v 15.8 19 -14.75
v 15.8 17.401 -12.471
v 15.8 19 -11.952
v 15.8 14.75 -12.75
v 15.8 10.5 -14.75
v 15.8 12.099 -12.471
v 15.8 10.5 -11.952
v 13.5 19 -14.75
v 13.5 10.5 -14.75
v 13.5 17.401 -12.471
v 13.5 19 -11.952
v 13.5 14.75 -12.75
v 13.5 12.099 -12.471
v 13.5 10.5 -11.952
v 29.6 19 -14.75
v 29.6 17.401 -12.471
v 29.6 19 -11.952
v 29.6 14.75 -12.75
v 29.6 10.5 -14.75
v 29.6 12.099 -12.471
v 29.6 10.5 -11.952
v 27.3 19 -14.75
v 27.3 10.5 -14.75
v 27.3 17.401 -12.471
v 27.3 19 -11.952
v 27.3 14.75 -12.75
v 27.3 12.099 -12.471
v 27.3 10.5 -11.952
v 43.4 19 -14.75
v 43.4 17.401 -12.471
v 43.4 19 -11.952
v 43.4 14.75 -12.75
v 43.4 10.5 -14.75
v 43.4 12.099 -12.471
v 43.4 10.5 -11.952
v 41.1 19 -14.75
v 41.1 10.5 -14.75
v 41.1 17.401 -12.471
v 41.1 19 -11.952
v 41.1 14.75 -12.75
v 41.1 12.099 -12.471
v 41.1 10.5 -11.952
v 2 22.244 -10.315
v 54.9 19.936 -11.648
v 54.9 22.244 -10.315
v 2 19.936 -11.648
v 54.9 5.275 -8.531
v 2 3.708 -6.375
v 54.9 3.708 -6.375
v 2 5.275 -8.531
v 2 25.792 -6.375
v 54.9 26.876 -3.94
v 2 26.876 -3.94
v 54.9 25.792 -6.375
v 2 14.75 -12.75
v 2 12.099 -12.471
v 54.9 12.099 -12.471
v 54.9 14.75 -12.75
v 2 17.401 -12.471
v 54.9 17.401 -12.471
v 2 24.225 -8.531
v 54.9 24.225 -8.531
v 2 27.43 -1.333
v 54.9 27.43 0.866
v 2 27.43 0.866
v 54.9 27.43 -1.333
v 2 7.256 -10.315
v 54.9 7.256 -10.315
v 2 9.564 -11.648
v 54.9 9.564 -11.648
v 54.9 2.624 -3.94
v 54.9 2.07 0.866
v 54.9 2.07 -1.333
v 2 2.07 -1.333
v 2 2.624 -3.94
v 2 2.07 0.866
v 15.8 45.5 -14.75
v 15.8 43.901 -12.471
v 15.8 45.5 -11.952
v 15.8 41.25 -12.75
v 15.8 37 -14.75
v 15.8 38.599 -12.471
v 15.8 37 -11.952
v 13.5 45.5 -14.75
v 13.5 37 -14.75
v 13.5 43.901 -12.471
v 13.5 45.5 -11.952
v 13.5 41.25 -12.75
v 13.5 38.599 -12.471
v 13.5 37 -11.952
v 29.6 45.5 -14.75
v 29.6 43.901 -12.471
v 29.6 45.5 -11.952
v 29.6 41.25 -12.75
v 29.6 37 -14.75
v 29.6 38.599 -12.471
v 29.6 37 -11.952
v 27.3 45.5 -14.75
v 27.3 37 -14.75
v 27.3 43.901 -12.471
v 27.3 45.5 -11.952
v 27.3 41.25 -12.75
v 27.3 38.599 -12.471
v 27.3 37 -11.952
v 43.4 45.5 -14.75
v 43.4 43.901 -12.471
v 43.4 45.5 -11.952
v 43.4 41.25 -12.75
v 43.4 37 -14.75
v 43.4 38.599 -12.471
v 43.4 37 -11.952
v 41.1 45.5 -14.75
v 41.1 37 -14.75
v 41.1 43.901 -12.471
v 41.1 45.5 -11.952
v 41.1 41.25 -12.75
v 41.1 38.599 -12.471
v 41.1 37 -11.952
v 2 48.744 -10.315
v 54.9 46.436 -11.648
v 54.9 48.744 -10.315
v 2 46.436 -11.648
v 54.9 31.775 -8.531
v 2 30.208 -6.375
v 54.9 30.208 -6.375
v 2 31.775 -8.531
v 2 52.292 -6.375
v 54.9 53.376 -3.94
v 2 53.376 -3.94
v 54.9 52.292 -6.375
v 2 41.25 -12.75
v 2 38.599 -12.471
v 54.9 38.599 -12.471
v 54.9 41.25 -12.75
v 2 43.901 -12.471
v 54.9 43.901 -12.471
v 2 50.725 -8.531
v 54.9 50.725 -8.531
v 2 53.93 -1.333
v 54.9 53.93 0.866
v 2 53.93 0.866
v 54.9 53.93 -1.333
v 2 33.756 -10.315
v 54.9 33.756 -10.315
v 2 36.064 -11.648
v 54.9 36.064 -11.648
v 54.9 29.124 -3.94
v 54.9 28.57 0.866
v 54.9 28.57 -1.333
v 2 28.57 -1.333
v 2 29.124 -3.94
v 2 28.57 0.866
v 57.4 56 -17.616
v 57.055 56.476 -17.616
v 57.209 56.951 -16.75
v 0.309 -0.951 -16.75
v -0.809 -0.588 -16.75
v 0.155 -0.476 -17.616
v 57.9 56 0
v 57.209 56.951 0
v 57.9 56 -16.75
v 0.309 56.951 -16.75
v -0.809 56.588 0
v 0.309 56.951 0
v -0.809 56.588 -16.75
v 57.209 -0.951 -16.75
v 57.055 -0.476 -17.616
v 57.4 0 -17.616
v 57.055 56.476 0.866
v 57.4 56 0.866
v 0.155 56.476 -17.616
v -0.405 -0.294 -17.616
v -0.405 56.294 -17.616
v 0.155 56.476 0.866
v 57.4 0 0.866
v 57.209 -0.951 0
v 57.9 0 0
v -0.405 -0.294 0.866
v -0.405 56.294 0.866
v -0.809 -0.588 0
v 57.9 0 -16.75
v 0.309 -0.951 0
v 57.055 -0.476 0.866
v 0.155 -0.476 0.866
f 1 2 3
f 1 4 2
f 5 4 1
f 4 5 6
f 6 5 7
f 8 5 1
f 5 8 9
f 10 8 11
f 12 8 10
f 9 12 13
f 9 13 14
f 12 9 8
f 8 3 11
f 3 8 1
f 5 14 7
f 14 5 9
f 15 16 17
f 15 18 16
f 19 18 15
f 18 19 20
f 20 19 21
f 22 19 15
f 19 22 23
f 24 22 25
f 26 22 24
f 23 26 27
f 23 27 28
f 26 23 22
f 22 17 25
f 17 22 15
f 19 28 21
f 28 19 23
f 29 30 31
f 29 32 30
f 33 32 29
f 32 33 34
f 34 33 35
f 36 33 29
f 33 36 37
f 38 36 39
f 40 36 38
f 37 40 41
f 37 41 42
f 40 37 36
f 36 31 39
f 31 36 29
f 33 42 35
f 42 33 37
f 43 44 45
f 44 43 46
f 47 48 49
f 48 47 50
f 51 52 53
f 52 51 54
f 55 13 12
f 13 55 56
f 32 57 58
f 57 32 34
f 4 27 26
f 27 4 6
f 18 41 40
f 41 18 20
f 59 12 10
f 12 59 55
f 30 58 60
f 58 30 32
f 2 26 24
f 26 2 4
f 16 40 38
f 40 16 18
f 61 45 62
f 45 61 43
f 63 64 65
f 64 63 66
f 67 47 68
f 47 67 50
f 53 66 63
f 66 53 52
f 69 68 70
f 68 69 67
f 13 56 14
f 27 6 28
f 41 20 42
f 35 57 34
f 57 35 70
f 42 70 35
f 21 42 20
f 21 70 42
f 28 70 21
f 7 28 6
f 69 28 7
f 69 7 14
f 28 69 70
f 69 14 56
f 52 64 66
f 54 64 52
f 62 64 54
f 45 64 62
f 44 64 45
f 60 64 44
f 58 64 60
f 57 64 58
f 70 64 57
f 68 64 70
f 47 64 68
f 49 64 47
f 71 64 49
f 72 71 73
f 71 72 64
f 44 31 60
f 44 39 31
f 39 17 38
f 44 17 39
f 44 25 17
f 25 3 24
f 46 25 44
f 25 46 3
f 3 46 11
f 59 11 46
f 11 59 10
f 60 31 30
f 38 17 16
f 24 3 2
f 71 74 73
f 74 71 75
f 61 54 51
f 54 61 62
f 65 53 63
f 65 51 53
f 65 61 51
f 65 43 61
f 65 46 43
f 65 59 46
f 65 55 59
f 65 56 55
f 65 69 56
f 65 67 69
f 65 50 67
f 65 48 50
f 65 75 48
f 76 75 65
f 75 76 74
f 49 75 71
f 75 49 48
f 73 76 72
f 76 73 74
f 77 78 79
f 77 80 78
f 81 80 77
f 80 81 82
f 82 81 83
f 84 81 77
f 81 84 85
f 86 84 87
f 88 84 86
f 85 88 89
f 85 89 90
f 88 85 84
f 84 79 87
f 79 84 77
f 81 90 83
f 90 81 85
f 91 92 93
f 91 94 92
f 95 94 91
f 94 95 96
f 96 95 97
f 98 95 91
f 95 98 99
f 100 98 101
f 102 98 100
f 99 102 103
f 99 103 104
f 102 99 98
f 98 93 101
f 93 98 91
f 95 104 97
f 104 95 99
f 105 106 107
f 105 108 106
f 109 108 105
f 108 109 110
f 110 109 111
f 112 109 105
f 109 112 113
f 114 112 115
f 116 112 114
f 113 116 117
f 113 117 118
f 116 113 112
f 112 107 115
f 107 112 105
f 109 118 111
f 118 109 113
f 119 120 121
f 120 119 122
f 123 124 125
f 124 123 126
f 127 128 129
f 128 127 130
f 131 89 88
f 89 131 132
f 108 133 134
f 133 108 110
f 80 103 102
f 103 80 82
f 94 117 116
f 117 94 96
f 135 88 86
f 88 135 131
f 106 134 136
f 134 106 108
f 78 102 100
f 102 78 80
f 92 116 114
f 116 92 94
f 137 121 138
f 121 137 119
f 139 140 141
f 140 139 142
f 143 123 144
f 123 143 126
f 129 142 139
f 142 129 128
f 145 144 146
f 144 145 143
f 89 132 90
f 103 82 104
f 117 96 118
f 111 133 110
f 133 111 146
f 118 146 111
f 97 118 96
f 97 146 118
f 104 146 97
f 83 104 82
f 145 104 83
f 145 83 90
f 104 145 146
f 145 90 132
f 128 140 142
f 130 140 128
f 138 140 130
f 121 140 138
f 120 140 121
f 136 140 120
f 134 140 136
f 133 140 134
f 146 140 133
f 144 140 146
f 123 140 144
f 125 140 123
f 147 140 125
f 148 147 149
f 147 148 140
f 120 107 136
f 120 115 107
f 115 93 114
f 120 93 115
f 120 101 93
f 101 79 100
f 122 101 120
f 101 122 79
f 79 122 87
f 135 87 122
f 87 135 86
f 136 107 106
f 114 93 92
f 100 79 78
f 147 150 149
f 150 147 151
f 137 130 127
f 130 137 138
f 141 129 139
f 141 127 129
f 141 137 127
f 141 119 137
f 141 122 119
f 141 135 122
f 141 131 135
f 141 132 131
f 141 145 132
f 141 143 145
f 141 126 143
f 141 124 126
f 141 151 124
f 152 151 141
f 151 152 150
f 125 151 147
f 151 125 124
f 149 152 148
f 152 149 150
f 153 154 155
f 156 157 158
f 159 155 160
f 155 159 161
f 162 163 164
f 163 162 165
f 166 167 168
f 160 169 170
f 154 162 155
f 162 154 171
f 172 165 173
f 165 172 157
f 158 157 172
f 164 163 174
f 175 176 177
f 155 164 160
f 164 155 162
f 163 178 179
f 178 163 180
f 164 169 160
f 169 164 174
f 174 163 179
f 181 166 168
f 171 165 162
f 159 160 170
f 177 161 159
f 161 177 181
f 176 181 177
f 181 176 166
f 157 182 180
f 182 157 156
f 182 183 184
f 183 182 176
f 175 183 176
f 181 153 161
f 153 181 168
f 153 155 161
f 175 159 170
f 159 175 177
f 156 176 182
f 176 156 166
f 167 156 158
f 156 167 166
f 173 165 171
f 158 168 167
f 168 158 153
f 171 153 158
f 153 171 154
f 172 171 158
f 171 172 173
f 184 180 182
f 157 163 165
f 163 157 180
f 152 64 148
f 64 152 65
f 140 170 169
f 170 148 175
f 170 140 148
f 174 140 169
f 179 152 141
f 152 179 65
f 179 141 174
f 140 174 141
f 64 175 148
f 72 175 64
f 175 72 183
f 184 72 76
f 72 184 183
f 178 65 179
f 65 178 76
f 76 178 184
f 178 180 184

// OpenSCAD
smallTokenDiameter=11.5;
largeTokenDiameter=25.5;

wallThickness=2;
tokensBetweenSpacers=5;
tokenDiameter=largeTokenDiameter;
tokenWidth=2.3;
numberOfTokensPerBox=20;
numberOfBoxes=2;


numberOfTokenSpacers=floor((numberOfTokensPerBox-1)/tokensBetweenSpacers);
length=tokenWidth * numberOfTokensPerBox + tokenWidth * numberOfTokenSpacers + wallThickness * 2;
width=tokenDiameter * numberOfBoxes +
      wallThickness * 2 + // left and right side
      wallThickness/2 * (numberOfBoxes-1); // center spacers
height=tokenDiameter/2 + wallThickness * 2;  // Extra thick on bottom to deal with spacers

echo("numberOfTokenSpacers:", numberOfTokenSpacers);
echo("length:", length);
echo("width:", width);
echo("height:", height);


difference() {
    translate([0, 0, -height]) {
        minkowski() {
            cube([length, width, height], center=false);
            sphere(1);
        }
        
    }

    translate([wallThickness,wallThickness,0]) {
        for (i=[0:1:numberOfBoxes-1]) {
            translate([0,(tokenDiameter/2 + tokenDiameter*i + wallThickness*i/2),0])
                cylinderWithNotches(diameter=tokenDiameter, length=length-wallThickness*2);
        }
    }
}

module cylinderWithNotches(diameter, length ) {
    rotate([0,90,0])
        cylinder(d=diameter,h=length);

    for (i=[1:1:numberOfTokenSpacers]) {
        translate([i * (tokensBetweenSpacers+1) * tokenWidth - tokenWidth/2, 0, -diameter/2])
            cube([tokenWidth,diameter/3,wallThickness*2], center=true);
    }
}
